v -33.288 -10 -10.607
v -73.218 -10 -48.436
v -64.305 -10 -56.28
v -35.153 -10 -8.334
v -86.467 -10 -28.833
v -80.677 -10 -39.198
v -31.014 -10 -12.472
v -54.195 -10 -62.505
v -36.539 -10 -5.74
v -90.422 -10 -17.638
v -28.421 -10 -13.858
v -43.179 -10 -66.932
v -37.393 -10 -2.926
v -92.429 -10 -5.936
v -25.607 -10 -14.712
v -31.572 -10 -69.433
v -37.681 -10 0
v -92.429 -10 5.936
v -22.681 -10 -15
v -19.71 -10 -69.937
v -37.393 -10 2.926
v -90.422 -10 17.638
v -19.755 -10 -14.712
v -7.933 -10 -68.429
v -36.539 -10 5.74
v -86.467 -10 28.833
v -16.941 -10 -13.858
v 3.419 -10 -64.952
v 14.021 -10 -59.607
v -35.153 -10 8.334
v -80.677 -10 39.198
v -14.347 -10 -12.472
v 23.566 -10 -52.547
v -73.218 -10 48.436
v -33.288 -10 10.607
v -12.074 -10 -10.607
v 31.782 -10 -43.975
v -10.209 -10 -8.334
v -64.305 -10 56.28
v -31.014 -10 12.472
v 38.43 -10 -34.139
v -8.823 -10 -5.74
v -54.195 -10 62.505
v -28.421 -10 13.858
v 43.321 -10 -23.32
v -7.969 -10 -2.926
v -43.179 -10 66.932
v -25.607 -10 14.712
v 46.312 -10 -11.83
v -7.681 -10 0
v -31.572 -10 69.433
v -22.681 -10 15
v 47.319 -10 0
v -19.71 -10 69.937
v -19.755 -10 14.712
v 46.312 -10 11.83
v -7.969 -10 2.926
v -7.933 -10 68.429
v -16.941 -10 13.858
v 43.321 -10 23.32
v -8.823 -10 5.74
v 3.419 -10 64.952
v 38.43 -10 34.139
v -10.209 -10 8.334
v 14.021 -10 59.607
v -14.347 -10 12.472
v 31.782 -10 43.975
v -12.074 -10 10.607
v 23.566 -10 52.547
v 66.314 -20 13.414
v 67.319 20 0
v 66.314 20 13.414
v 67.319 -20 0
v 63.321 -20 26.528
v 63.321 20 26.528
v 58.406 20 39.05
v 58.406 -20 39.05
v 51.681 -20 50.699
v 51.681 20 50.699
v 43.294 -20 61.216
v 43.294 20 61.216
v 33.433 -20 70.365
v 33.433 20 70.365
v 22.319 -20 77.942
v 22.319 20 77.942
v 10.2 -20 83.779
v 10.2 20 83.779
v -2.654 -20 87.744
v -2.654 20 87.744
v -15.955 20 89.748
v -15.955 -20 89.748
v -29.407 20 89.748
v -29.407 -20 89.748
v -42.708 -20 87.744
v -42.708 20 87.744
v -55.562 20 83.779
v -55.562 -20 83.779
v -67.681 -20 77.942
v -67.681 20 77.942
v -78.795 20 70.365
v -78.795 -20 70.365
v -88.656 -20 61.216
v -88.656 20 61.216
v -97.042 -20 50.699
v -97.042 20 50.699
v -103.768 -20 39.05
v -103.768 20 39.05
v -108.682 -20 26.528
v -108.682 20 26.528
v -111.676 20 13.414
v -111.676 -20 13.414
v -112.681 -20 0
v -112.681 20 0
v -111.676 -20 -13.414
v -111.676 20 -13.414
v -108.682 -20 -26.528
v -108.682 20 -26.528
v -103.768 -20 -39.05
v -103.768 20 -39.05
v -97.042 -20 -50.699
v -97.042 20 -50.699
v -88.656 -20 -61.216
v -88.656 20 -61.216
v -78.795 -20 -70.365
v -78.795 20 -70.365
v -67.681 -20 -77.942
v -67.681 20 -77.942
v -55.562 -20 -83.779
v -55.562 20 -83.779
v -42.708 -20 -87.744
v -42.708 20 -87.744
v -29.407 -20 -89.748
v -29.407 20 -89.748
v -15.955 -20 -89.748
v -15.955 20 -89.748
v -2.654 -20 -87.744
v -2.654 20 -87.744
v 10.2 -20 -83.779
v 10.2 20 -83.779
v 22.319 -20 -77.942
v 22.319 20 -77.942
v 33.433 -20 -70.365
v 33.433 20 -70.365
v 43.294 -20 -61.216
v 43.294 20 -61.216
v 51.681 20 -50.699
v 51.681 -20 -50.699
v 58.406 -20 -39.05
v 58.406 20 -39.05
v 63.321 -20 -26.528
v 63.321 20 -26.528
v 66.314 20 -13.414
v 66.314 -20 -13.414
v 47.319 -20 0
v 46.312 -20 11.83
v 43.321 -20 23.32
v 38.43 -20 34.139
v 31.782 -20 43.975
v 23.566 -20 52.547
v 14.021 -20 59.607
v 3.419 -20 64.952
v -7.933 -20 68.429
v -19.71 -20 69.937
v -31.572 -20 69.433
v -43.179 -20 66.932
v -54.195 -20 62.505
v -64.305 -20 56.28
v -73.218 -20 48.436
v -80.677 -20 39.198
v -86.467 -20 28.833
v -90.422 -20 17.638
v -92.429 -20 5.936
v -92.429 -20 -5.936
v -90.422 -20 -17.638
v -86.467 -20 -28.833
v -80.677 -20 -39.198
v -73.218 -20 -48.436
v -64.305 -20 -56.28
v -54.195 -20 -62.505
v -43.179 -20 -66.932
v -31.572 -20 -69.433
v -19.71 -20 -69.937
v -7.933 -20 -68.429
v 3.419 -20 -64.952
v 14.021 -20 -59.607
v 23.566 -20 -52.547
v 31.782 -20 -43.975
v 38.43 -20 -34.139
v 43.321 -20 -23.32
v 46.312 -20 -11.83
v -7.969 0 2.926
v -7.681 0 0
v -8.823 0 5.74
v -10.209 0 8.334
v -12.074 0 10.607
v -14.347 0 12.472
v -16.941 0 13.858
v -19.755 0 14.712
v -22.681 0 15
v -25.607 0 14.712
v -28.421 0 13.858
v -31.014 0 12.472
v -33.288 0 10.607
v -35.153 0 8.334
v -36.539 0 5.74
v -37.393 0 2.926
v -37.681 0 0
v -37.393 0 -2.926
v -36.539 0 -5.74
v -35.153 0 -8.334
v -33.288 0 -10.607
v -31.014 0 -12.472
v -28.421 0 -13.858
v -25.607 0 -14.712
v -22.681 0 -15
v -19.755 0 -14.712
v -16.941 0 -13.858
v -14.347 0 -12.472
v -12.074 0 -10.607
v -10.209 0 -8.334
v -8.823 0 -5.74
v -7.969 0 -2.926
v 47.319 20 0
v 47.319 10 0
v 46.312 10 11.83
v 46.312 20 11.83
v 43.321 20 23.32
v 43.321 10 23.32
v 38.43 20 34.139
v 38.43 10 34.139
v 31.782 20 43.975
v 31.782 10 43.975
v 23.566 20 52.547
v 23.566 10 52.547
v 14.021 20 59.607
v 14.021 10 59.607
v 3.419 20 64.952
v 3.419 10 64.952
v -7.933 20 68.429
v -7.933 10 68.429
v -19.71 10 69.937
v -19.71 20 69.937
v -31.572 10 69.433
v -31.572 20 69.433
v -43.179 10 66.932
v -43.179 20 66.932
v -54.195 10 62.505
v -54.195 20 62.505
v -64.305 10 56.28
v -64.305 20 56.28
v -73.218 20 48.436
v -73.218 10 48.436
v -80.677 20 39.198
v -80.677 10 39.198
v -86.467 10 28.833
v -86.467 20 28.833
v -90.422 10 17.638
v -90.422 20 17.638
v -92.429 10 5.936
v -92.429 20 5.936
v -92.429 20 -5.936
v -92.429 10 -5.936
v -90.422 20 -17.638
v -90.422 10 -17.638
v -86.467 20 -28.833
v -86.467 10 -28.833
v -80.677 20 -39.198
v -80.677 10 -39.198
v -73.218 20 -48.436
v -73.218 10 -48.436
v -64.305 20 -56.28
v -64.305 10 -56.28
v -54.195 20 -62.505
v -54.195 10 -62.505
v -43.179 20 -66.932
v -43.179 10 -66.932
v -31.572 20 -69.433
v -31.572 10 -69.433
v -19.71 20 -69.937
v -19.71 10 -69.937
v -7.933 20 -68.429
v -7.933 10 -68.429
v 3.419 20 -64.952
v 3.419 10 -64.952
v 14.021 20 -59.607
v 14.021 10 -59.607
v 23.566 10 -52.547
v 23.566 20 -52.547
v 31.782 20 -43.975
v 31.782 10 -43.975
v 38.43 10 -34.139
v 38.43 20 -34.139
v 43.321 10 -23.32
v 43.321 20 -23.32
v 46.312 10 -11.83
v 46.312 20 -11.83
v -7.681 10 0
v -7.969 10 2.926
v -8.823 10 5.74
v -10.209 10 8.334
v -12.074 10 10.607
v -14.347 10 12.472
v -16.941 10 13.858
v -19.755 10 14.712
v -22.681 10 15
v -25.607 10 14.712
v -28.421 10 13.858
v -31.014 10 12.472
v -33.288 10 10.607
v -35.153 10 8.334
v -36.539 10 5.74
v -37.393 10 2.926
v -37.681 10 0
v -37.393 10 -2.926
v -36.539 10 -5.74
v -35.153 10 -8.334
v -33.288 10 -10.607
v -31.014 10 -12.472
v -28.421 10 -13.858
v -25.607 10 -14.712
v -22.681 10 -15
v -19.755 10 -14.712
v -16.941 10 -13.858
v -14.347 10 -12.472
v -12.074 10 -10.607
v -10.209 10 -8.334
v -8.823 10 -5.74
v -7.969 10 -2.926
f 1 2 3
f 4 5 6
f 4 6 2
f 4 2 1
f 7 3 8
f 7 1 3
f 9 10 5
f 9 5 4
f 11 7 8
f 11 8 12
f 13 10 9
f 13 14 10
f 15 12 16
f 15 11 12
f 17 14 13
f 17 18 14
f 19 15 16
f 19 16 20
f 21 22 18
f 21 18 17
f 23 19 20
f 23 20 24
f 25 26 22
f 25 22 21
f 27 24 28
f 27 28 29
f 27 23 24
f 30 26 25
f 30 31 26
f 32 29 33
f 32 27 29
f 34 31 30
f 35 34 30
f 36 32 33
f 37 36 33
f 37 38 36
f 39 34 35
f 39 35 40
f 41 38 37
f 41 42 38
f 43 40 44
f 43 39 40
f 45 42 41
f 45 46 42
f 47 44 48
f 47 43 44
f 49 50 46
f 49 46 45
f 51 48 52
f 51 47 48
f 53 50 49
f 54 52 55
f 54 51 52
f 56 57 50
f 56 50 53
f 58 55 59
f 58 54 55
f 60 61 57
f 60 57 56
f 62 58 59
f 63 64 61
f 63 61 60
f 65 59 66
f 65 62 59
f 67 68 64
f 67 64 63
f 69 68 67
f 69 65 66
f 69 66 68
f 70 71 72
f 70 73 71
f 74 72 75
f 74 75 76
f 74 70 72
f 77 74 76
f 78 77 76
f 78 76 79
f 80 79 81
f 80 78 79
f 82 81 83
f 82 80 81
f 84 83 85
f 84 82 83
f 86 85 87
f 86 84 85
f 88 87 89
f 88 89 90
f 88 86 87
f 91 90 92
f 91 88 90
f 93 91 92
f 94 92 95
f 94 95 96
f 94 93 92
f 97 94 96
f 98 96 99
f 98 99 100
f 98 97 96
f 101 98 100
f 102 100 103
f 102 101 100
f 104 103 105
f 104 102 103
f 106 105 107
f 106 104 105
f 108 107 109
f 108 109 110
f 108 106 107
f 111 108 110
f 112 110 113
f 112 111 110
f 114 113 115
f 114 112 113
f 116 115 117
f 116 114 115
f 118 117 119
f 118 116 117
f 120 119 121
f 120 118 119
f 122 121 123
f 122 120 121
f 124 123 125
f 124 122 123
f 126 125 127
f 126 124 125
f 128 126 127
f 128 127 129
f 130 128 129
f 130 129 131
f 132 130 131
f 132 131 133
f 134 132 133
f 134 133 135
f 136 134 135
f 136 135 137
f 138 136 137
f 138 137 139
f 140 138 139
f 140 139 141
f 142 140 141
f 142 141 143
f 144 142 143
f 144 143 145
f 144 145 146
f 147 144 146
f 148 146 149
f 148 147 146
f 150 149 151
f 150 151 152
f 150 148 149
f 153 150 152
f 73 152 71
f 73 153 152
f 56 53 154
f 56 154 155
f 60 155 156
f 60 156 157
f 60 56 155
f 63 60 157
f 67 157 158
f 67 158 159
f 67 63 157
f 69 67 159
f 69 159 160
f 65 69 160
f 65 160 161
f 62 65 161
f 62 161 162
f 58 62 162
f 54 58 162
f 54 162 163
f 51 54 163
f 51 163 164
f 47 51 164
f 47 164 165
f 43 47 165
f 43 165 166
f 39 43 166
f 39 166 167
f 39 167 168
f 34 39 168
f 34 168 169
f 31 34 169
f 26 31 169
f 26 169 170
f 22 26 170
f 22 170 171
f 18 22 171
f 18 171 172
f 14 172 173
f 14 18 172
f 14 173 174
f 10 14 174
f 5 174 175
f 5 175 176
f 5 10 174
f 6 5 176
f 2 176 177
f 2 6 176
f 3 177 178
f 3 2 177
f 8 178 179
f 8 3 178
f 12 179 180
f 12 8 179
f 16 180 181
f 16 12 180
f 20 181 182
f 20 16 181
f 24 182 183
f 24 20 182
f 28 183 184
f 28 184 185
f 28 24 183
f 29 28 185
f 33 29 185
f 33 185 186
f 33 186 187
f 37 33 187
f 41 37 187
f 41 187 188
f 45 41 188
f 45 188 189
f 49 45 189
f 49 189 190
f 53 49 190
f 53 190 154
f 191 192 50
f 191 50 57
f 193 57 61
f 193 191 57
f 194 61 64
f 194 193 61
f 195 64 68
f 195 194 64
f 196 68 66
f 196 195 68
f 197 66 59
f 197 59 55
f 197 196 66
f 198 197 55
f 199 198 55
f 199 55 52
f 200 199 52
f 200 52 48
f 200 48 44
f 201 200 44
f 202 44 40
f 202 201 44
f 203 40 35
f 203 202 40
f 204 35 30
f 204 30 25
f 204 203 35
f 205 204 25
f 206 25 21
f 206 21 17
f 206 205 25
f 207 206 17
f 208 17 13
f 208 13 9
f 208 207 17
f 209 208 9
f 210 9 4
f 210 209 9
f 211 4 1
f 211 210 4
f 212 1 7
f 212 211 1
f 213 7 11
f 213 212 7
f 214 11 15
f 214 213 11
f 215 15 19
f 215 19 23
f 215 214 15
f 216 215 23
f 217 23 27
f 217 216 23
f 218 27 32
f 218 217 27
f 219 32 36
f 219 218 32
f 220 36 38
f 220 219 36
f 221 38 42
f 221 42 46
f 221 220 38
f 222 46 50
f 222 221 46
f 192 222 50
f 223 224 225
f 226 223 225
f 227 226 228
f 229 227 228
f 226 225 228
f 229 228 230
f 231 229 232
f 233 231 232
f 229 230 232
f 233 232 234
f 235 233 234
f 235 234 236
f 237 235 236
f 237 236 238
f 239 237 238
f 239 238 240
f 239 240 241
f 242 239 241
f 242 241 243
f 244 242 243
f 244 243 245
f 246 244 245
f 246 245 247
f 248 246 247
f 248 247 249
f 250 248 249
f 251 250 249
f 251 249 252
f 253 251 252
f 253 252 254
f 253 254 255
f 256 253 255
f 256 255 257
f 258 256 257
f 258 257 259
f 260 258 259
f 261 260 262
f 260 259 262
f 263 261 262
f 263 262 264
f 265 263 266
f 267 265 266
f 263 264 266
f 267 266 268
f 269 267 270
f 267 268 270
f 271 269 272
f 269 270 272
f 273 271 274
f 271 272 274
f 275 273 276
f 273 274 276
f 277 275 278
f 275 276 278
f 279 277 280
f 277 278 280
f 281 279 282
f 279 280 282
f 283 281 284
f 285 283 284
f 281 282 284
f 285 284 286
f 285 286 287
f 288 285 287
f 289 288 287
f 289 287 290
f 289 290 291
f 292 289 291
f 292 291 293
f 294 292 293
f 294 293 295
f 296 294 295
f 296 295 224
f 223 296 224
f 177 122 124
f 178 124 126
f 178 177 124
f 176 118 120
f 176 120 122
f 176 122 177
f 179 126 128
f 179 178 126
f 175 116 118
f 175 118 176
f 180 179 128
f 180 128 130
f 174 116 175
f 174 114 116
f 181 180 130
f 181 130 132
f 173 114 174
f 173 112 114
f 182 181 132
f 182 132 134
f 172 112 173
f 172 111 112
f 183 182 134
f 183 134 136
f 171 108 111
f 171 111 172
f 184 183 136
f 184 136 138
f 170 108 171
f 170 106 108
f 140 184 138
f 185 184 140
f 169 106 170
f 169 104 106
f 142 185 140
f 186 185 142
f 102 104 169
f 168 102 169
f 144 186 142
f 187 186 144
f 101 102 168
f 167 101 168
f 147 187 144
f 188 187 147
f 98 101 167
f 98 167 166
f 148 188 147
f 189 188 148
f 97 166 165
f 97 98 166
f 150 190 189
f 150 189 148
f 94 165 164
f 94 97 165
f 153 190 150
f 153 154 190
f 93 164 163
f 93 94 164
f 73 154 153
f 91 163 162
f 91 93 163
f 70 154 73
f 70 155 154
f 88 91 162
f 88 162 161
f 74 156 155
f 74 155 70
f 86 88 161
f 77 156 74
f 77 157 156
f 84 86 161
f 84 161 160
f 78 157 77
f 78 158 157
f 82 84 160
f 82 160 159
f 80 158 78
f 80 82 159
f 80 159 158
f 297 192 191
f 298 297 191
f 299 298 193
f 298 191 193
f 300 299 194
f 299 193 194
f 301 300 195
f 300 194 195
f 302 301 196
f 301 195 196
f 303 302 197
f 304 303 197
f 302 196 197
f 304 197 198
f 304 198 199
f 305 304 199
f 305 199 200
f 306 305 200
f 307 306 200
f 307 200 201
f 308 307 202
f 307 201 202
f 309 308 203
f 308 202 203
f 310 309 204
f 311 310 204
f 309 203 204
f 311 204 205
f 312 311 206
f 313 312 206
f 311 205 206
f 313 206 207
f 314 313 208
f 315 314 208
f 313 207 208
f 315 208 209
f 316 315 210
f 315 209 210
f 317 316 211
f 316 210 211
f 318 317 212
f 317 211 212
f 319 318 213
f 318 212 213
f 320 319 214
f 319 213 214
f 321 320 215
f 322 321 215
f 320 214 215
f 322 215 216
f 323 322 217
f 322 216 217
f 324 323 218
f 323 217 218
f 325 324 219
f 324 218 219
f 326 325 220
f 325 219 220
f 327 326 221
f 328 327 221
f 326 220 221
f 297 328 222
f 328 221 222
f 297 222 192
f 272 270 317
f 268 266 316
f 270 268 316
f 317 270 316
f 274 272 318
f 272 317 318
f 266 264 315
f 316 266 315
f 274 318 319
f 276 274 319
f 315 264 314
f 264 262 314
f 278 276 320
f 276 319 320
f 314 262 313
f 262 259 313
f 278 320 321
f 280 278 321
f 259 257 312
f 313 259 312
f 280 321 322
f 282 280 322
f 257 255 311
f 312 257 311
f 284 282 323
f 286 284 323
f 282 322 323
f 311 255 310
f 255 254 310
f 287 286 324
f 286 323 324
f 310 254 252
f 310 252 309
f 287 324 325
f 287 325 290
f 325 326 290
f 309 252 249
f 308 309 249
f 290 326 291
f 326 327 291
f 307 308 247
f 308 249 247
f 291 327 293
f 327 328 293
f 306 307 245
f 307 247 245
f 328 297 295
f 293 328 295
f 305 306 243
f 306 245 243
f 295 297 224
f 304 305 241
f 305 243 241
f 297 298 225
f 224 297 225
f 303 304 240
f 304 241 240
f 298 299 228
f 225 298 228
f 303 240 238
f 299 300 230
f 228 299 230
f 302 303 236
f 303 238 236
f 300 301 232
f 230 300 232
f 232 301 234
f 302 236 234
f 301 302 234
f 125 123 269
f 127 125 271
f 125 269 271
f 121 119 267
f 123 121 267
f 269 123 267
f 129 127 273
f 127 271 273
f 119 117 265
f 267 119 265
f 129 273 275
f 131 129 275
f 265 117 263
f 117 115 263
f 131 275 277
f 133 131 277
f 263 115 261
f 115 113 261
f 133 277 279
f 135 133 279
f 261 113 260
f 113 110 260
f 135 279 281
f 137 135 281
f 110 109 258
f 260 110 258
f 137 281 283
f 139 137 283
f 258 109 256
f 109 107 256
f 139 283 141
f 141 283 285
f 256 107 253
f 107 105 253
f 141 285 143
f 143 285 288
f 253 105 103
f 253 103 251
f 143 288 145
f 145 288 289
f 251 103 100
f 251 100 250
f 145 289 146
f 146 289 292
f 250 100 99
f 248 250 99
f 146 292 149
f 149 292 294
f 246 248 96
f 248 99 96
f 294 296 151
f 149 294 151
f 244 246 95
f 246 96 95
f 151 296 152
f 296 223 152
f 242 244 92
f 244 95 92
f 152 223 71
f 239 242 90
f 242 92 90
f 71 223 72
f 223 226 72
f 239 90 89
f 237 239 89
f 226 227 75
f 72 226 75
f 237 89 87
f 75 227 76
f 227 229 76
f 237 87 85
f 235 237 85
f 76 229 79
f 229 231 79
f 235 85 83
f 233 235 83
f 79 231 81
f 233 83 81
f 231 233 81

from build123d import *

# Parameters (mm, degrees)
F0_R          = 90
F0_R_2        = 70
F1_DEPTH      = 20
F1_DEPTH_BACK = 20
F0_R_3        = 15
F2_DEPTH      = 10
F2_DEPTH_BACK = 10


with BuildPart() as f1:
    # F0 (on Front) → F1 (new body, two sides)
    with BuildSketch(Plane.XZ) as f1_sk:
        with Locations((-22.680921, 0)):
            Circle(F0_R)
        with Locations((-22.680921, 0)):
            Circle(F0_R_2, mode=Mode.SUBTRACT)
    extrude(amount=F1_DEPTH)
    extrude(f1_sk.sketch, amount=-F1_DEPTH_BACK)

    # F0 (on Front) → F2 (join, two sides)
    with BuildSketch(Plane.XZ) as f2_sk:
        with Locations((-22.680921, 0)):
            Circle(F0_R_2)
        with Locations((-22.680921, 0)):
            Circle(F0_R_3, mode=Mode.SUBTRACT)
    extrude(amount=F2_DEPTH)
    extrude(f2_sk.sketch, amount=-F2_DEPTH_BACK)


solid = f1.part
